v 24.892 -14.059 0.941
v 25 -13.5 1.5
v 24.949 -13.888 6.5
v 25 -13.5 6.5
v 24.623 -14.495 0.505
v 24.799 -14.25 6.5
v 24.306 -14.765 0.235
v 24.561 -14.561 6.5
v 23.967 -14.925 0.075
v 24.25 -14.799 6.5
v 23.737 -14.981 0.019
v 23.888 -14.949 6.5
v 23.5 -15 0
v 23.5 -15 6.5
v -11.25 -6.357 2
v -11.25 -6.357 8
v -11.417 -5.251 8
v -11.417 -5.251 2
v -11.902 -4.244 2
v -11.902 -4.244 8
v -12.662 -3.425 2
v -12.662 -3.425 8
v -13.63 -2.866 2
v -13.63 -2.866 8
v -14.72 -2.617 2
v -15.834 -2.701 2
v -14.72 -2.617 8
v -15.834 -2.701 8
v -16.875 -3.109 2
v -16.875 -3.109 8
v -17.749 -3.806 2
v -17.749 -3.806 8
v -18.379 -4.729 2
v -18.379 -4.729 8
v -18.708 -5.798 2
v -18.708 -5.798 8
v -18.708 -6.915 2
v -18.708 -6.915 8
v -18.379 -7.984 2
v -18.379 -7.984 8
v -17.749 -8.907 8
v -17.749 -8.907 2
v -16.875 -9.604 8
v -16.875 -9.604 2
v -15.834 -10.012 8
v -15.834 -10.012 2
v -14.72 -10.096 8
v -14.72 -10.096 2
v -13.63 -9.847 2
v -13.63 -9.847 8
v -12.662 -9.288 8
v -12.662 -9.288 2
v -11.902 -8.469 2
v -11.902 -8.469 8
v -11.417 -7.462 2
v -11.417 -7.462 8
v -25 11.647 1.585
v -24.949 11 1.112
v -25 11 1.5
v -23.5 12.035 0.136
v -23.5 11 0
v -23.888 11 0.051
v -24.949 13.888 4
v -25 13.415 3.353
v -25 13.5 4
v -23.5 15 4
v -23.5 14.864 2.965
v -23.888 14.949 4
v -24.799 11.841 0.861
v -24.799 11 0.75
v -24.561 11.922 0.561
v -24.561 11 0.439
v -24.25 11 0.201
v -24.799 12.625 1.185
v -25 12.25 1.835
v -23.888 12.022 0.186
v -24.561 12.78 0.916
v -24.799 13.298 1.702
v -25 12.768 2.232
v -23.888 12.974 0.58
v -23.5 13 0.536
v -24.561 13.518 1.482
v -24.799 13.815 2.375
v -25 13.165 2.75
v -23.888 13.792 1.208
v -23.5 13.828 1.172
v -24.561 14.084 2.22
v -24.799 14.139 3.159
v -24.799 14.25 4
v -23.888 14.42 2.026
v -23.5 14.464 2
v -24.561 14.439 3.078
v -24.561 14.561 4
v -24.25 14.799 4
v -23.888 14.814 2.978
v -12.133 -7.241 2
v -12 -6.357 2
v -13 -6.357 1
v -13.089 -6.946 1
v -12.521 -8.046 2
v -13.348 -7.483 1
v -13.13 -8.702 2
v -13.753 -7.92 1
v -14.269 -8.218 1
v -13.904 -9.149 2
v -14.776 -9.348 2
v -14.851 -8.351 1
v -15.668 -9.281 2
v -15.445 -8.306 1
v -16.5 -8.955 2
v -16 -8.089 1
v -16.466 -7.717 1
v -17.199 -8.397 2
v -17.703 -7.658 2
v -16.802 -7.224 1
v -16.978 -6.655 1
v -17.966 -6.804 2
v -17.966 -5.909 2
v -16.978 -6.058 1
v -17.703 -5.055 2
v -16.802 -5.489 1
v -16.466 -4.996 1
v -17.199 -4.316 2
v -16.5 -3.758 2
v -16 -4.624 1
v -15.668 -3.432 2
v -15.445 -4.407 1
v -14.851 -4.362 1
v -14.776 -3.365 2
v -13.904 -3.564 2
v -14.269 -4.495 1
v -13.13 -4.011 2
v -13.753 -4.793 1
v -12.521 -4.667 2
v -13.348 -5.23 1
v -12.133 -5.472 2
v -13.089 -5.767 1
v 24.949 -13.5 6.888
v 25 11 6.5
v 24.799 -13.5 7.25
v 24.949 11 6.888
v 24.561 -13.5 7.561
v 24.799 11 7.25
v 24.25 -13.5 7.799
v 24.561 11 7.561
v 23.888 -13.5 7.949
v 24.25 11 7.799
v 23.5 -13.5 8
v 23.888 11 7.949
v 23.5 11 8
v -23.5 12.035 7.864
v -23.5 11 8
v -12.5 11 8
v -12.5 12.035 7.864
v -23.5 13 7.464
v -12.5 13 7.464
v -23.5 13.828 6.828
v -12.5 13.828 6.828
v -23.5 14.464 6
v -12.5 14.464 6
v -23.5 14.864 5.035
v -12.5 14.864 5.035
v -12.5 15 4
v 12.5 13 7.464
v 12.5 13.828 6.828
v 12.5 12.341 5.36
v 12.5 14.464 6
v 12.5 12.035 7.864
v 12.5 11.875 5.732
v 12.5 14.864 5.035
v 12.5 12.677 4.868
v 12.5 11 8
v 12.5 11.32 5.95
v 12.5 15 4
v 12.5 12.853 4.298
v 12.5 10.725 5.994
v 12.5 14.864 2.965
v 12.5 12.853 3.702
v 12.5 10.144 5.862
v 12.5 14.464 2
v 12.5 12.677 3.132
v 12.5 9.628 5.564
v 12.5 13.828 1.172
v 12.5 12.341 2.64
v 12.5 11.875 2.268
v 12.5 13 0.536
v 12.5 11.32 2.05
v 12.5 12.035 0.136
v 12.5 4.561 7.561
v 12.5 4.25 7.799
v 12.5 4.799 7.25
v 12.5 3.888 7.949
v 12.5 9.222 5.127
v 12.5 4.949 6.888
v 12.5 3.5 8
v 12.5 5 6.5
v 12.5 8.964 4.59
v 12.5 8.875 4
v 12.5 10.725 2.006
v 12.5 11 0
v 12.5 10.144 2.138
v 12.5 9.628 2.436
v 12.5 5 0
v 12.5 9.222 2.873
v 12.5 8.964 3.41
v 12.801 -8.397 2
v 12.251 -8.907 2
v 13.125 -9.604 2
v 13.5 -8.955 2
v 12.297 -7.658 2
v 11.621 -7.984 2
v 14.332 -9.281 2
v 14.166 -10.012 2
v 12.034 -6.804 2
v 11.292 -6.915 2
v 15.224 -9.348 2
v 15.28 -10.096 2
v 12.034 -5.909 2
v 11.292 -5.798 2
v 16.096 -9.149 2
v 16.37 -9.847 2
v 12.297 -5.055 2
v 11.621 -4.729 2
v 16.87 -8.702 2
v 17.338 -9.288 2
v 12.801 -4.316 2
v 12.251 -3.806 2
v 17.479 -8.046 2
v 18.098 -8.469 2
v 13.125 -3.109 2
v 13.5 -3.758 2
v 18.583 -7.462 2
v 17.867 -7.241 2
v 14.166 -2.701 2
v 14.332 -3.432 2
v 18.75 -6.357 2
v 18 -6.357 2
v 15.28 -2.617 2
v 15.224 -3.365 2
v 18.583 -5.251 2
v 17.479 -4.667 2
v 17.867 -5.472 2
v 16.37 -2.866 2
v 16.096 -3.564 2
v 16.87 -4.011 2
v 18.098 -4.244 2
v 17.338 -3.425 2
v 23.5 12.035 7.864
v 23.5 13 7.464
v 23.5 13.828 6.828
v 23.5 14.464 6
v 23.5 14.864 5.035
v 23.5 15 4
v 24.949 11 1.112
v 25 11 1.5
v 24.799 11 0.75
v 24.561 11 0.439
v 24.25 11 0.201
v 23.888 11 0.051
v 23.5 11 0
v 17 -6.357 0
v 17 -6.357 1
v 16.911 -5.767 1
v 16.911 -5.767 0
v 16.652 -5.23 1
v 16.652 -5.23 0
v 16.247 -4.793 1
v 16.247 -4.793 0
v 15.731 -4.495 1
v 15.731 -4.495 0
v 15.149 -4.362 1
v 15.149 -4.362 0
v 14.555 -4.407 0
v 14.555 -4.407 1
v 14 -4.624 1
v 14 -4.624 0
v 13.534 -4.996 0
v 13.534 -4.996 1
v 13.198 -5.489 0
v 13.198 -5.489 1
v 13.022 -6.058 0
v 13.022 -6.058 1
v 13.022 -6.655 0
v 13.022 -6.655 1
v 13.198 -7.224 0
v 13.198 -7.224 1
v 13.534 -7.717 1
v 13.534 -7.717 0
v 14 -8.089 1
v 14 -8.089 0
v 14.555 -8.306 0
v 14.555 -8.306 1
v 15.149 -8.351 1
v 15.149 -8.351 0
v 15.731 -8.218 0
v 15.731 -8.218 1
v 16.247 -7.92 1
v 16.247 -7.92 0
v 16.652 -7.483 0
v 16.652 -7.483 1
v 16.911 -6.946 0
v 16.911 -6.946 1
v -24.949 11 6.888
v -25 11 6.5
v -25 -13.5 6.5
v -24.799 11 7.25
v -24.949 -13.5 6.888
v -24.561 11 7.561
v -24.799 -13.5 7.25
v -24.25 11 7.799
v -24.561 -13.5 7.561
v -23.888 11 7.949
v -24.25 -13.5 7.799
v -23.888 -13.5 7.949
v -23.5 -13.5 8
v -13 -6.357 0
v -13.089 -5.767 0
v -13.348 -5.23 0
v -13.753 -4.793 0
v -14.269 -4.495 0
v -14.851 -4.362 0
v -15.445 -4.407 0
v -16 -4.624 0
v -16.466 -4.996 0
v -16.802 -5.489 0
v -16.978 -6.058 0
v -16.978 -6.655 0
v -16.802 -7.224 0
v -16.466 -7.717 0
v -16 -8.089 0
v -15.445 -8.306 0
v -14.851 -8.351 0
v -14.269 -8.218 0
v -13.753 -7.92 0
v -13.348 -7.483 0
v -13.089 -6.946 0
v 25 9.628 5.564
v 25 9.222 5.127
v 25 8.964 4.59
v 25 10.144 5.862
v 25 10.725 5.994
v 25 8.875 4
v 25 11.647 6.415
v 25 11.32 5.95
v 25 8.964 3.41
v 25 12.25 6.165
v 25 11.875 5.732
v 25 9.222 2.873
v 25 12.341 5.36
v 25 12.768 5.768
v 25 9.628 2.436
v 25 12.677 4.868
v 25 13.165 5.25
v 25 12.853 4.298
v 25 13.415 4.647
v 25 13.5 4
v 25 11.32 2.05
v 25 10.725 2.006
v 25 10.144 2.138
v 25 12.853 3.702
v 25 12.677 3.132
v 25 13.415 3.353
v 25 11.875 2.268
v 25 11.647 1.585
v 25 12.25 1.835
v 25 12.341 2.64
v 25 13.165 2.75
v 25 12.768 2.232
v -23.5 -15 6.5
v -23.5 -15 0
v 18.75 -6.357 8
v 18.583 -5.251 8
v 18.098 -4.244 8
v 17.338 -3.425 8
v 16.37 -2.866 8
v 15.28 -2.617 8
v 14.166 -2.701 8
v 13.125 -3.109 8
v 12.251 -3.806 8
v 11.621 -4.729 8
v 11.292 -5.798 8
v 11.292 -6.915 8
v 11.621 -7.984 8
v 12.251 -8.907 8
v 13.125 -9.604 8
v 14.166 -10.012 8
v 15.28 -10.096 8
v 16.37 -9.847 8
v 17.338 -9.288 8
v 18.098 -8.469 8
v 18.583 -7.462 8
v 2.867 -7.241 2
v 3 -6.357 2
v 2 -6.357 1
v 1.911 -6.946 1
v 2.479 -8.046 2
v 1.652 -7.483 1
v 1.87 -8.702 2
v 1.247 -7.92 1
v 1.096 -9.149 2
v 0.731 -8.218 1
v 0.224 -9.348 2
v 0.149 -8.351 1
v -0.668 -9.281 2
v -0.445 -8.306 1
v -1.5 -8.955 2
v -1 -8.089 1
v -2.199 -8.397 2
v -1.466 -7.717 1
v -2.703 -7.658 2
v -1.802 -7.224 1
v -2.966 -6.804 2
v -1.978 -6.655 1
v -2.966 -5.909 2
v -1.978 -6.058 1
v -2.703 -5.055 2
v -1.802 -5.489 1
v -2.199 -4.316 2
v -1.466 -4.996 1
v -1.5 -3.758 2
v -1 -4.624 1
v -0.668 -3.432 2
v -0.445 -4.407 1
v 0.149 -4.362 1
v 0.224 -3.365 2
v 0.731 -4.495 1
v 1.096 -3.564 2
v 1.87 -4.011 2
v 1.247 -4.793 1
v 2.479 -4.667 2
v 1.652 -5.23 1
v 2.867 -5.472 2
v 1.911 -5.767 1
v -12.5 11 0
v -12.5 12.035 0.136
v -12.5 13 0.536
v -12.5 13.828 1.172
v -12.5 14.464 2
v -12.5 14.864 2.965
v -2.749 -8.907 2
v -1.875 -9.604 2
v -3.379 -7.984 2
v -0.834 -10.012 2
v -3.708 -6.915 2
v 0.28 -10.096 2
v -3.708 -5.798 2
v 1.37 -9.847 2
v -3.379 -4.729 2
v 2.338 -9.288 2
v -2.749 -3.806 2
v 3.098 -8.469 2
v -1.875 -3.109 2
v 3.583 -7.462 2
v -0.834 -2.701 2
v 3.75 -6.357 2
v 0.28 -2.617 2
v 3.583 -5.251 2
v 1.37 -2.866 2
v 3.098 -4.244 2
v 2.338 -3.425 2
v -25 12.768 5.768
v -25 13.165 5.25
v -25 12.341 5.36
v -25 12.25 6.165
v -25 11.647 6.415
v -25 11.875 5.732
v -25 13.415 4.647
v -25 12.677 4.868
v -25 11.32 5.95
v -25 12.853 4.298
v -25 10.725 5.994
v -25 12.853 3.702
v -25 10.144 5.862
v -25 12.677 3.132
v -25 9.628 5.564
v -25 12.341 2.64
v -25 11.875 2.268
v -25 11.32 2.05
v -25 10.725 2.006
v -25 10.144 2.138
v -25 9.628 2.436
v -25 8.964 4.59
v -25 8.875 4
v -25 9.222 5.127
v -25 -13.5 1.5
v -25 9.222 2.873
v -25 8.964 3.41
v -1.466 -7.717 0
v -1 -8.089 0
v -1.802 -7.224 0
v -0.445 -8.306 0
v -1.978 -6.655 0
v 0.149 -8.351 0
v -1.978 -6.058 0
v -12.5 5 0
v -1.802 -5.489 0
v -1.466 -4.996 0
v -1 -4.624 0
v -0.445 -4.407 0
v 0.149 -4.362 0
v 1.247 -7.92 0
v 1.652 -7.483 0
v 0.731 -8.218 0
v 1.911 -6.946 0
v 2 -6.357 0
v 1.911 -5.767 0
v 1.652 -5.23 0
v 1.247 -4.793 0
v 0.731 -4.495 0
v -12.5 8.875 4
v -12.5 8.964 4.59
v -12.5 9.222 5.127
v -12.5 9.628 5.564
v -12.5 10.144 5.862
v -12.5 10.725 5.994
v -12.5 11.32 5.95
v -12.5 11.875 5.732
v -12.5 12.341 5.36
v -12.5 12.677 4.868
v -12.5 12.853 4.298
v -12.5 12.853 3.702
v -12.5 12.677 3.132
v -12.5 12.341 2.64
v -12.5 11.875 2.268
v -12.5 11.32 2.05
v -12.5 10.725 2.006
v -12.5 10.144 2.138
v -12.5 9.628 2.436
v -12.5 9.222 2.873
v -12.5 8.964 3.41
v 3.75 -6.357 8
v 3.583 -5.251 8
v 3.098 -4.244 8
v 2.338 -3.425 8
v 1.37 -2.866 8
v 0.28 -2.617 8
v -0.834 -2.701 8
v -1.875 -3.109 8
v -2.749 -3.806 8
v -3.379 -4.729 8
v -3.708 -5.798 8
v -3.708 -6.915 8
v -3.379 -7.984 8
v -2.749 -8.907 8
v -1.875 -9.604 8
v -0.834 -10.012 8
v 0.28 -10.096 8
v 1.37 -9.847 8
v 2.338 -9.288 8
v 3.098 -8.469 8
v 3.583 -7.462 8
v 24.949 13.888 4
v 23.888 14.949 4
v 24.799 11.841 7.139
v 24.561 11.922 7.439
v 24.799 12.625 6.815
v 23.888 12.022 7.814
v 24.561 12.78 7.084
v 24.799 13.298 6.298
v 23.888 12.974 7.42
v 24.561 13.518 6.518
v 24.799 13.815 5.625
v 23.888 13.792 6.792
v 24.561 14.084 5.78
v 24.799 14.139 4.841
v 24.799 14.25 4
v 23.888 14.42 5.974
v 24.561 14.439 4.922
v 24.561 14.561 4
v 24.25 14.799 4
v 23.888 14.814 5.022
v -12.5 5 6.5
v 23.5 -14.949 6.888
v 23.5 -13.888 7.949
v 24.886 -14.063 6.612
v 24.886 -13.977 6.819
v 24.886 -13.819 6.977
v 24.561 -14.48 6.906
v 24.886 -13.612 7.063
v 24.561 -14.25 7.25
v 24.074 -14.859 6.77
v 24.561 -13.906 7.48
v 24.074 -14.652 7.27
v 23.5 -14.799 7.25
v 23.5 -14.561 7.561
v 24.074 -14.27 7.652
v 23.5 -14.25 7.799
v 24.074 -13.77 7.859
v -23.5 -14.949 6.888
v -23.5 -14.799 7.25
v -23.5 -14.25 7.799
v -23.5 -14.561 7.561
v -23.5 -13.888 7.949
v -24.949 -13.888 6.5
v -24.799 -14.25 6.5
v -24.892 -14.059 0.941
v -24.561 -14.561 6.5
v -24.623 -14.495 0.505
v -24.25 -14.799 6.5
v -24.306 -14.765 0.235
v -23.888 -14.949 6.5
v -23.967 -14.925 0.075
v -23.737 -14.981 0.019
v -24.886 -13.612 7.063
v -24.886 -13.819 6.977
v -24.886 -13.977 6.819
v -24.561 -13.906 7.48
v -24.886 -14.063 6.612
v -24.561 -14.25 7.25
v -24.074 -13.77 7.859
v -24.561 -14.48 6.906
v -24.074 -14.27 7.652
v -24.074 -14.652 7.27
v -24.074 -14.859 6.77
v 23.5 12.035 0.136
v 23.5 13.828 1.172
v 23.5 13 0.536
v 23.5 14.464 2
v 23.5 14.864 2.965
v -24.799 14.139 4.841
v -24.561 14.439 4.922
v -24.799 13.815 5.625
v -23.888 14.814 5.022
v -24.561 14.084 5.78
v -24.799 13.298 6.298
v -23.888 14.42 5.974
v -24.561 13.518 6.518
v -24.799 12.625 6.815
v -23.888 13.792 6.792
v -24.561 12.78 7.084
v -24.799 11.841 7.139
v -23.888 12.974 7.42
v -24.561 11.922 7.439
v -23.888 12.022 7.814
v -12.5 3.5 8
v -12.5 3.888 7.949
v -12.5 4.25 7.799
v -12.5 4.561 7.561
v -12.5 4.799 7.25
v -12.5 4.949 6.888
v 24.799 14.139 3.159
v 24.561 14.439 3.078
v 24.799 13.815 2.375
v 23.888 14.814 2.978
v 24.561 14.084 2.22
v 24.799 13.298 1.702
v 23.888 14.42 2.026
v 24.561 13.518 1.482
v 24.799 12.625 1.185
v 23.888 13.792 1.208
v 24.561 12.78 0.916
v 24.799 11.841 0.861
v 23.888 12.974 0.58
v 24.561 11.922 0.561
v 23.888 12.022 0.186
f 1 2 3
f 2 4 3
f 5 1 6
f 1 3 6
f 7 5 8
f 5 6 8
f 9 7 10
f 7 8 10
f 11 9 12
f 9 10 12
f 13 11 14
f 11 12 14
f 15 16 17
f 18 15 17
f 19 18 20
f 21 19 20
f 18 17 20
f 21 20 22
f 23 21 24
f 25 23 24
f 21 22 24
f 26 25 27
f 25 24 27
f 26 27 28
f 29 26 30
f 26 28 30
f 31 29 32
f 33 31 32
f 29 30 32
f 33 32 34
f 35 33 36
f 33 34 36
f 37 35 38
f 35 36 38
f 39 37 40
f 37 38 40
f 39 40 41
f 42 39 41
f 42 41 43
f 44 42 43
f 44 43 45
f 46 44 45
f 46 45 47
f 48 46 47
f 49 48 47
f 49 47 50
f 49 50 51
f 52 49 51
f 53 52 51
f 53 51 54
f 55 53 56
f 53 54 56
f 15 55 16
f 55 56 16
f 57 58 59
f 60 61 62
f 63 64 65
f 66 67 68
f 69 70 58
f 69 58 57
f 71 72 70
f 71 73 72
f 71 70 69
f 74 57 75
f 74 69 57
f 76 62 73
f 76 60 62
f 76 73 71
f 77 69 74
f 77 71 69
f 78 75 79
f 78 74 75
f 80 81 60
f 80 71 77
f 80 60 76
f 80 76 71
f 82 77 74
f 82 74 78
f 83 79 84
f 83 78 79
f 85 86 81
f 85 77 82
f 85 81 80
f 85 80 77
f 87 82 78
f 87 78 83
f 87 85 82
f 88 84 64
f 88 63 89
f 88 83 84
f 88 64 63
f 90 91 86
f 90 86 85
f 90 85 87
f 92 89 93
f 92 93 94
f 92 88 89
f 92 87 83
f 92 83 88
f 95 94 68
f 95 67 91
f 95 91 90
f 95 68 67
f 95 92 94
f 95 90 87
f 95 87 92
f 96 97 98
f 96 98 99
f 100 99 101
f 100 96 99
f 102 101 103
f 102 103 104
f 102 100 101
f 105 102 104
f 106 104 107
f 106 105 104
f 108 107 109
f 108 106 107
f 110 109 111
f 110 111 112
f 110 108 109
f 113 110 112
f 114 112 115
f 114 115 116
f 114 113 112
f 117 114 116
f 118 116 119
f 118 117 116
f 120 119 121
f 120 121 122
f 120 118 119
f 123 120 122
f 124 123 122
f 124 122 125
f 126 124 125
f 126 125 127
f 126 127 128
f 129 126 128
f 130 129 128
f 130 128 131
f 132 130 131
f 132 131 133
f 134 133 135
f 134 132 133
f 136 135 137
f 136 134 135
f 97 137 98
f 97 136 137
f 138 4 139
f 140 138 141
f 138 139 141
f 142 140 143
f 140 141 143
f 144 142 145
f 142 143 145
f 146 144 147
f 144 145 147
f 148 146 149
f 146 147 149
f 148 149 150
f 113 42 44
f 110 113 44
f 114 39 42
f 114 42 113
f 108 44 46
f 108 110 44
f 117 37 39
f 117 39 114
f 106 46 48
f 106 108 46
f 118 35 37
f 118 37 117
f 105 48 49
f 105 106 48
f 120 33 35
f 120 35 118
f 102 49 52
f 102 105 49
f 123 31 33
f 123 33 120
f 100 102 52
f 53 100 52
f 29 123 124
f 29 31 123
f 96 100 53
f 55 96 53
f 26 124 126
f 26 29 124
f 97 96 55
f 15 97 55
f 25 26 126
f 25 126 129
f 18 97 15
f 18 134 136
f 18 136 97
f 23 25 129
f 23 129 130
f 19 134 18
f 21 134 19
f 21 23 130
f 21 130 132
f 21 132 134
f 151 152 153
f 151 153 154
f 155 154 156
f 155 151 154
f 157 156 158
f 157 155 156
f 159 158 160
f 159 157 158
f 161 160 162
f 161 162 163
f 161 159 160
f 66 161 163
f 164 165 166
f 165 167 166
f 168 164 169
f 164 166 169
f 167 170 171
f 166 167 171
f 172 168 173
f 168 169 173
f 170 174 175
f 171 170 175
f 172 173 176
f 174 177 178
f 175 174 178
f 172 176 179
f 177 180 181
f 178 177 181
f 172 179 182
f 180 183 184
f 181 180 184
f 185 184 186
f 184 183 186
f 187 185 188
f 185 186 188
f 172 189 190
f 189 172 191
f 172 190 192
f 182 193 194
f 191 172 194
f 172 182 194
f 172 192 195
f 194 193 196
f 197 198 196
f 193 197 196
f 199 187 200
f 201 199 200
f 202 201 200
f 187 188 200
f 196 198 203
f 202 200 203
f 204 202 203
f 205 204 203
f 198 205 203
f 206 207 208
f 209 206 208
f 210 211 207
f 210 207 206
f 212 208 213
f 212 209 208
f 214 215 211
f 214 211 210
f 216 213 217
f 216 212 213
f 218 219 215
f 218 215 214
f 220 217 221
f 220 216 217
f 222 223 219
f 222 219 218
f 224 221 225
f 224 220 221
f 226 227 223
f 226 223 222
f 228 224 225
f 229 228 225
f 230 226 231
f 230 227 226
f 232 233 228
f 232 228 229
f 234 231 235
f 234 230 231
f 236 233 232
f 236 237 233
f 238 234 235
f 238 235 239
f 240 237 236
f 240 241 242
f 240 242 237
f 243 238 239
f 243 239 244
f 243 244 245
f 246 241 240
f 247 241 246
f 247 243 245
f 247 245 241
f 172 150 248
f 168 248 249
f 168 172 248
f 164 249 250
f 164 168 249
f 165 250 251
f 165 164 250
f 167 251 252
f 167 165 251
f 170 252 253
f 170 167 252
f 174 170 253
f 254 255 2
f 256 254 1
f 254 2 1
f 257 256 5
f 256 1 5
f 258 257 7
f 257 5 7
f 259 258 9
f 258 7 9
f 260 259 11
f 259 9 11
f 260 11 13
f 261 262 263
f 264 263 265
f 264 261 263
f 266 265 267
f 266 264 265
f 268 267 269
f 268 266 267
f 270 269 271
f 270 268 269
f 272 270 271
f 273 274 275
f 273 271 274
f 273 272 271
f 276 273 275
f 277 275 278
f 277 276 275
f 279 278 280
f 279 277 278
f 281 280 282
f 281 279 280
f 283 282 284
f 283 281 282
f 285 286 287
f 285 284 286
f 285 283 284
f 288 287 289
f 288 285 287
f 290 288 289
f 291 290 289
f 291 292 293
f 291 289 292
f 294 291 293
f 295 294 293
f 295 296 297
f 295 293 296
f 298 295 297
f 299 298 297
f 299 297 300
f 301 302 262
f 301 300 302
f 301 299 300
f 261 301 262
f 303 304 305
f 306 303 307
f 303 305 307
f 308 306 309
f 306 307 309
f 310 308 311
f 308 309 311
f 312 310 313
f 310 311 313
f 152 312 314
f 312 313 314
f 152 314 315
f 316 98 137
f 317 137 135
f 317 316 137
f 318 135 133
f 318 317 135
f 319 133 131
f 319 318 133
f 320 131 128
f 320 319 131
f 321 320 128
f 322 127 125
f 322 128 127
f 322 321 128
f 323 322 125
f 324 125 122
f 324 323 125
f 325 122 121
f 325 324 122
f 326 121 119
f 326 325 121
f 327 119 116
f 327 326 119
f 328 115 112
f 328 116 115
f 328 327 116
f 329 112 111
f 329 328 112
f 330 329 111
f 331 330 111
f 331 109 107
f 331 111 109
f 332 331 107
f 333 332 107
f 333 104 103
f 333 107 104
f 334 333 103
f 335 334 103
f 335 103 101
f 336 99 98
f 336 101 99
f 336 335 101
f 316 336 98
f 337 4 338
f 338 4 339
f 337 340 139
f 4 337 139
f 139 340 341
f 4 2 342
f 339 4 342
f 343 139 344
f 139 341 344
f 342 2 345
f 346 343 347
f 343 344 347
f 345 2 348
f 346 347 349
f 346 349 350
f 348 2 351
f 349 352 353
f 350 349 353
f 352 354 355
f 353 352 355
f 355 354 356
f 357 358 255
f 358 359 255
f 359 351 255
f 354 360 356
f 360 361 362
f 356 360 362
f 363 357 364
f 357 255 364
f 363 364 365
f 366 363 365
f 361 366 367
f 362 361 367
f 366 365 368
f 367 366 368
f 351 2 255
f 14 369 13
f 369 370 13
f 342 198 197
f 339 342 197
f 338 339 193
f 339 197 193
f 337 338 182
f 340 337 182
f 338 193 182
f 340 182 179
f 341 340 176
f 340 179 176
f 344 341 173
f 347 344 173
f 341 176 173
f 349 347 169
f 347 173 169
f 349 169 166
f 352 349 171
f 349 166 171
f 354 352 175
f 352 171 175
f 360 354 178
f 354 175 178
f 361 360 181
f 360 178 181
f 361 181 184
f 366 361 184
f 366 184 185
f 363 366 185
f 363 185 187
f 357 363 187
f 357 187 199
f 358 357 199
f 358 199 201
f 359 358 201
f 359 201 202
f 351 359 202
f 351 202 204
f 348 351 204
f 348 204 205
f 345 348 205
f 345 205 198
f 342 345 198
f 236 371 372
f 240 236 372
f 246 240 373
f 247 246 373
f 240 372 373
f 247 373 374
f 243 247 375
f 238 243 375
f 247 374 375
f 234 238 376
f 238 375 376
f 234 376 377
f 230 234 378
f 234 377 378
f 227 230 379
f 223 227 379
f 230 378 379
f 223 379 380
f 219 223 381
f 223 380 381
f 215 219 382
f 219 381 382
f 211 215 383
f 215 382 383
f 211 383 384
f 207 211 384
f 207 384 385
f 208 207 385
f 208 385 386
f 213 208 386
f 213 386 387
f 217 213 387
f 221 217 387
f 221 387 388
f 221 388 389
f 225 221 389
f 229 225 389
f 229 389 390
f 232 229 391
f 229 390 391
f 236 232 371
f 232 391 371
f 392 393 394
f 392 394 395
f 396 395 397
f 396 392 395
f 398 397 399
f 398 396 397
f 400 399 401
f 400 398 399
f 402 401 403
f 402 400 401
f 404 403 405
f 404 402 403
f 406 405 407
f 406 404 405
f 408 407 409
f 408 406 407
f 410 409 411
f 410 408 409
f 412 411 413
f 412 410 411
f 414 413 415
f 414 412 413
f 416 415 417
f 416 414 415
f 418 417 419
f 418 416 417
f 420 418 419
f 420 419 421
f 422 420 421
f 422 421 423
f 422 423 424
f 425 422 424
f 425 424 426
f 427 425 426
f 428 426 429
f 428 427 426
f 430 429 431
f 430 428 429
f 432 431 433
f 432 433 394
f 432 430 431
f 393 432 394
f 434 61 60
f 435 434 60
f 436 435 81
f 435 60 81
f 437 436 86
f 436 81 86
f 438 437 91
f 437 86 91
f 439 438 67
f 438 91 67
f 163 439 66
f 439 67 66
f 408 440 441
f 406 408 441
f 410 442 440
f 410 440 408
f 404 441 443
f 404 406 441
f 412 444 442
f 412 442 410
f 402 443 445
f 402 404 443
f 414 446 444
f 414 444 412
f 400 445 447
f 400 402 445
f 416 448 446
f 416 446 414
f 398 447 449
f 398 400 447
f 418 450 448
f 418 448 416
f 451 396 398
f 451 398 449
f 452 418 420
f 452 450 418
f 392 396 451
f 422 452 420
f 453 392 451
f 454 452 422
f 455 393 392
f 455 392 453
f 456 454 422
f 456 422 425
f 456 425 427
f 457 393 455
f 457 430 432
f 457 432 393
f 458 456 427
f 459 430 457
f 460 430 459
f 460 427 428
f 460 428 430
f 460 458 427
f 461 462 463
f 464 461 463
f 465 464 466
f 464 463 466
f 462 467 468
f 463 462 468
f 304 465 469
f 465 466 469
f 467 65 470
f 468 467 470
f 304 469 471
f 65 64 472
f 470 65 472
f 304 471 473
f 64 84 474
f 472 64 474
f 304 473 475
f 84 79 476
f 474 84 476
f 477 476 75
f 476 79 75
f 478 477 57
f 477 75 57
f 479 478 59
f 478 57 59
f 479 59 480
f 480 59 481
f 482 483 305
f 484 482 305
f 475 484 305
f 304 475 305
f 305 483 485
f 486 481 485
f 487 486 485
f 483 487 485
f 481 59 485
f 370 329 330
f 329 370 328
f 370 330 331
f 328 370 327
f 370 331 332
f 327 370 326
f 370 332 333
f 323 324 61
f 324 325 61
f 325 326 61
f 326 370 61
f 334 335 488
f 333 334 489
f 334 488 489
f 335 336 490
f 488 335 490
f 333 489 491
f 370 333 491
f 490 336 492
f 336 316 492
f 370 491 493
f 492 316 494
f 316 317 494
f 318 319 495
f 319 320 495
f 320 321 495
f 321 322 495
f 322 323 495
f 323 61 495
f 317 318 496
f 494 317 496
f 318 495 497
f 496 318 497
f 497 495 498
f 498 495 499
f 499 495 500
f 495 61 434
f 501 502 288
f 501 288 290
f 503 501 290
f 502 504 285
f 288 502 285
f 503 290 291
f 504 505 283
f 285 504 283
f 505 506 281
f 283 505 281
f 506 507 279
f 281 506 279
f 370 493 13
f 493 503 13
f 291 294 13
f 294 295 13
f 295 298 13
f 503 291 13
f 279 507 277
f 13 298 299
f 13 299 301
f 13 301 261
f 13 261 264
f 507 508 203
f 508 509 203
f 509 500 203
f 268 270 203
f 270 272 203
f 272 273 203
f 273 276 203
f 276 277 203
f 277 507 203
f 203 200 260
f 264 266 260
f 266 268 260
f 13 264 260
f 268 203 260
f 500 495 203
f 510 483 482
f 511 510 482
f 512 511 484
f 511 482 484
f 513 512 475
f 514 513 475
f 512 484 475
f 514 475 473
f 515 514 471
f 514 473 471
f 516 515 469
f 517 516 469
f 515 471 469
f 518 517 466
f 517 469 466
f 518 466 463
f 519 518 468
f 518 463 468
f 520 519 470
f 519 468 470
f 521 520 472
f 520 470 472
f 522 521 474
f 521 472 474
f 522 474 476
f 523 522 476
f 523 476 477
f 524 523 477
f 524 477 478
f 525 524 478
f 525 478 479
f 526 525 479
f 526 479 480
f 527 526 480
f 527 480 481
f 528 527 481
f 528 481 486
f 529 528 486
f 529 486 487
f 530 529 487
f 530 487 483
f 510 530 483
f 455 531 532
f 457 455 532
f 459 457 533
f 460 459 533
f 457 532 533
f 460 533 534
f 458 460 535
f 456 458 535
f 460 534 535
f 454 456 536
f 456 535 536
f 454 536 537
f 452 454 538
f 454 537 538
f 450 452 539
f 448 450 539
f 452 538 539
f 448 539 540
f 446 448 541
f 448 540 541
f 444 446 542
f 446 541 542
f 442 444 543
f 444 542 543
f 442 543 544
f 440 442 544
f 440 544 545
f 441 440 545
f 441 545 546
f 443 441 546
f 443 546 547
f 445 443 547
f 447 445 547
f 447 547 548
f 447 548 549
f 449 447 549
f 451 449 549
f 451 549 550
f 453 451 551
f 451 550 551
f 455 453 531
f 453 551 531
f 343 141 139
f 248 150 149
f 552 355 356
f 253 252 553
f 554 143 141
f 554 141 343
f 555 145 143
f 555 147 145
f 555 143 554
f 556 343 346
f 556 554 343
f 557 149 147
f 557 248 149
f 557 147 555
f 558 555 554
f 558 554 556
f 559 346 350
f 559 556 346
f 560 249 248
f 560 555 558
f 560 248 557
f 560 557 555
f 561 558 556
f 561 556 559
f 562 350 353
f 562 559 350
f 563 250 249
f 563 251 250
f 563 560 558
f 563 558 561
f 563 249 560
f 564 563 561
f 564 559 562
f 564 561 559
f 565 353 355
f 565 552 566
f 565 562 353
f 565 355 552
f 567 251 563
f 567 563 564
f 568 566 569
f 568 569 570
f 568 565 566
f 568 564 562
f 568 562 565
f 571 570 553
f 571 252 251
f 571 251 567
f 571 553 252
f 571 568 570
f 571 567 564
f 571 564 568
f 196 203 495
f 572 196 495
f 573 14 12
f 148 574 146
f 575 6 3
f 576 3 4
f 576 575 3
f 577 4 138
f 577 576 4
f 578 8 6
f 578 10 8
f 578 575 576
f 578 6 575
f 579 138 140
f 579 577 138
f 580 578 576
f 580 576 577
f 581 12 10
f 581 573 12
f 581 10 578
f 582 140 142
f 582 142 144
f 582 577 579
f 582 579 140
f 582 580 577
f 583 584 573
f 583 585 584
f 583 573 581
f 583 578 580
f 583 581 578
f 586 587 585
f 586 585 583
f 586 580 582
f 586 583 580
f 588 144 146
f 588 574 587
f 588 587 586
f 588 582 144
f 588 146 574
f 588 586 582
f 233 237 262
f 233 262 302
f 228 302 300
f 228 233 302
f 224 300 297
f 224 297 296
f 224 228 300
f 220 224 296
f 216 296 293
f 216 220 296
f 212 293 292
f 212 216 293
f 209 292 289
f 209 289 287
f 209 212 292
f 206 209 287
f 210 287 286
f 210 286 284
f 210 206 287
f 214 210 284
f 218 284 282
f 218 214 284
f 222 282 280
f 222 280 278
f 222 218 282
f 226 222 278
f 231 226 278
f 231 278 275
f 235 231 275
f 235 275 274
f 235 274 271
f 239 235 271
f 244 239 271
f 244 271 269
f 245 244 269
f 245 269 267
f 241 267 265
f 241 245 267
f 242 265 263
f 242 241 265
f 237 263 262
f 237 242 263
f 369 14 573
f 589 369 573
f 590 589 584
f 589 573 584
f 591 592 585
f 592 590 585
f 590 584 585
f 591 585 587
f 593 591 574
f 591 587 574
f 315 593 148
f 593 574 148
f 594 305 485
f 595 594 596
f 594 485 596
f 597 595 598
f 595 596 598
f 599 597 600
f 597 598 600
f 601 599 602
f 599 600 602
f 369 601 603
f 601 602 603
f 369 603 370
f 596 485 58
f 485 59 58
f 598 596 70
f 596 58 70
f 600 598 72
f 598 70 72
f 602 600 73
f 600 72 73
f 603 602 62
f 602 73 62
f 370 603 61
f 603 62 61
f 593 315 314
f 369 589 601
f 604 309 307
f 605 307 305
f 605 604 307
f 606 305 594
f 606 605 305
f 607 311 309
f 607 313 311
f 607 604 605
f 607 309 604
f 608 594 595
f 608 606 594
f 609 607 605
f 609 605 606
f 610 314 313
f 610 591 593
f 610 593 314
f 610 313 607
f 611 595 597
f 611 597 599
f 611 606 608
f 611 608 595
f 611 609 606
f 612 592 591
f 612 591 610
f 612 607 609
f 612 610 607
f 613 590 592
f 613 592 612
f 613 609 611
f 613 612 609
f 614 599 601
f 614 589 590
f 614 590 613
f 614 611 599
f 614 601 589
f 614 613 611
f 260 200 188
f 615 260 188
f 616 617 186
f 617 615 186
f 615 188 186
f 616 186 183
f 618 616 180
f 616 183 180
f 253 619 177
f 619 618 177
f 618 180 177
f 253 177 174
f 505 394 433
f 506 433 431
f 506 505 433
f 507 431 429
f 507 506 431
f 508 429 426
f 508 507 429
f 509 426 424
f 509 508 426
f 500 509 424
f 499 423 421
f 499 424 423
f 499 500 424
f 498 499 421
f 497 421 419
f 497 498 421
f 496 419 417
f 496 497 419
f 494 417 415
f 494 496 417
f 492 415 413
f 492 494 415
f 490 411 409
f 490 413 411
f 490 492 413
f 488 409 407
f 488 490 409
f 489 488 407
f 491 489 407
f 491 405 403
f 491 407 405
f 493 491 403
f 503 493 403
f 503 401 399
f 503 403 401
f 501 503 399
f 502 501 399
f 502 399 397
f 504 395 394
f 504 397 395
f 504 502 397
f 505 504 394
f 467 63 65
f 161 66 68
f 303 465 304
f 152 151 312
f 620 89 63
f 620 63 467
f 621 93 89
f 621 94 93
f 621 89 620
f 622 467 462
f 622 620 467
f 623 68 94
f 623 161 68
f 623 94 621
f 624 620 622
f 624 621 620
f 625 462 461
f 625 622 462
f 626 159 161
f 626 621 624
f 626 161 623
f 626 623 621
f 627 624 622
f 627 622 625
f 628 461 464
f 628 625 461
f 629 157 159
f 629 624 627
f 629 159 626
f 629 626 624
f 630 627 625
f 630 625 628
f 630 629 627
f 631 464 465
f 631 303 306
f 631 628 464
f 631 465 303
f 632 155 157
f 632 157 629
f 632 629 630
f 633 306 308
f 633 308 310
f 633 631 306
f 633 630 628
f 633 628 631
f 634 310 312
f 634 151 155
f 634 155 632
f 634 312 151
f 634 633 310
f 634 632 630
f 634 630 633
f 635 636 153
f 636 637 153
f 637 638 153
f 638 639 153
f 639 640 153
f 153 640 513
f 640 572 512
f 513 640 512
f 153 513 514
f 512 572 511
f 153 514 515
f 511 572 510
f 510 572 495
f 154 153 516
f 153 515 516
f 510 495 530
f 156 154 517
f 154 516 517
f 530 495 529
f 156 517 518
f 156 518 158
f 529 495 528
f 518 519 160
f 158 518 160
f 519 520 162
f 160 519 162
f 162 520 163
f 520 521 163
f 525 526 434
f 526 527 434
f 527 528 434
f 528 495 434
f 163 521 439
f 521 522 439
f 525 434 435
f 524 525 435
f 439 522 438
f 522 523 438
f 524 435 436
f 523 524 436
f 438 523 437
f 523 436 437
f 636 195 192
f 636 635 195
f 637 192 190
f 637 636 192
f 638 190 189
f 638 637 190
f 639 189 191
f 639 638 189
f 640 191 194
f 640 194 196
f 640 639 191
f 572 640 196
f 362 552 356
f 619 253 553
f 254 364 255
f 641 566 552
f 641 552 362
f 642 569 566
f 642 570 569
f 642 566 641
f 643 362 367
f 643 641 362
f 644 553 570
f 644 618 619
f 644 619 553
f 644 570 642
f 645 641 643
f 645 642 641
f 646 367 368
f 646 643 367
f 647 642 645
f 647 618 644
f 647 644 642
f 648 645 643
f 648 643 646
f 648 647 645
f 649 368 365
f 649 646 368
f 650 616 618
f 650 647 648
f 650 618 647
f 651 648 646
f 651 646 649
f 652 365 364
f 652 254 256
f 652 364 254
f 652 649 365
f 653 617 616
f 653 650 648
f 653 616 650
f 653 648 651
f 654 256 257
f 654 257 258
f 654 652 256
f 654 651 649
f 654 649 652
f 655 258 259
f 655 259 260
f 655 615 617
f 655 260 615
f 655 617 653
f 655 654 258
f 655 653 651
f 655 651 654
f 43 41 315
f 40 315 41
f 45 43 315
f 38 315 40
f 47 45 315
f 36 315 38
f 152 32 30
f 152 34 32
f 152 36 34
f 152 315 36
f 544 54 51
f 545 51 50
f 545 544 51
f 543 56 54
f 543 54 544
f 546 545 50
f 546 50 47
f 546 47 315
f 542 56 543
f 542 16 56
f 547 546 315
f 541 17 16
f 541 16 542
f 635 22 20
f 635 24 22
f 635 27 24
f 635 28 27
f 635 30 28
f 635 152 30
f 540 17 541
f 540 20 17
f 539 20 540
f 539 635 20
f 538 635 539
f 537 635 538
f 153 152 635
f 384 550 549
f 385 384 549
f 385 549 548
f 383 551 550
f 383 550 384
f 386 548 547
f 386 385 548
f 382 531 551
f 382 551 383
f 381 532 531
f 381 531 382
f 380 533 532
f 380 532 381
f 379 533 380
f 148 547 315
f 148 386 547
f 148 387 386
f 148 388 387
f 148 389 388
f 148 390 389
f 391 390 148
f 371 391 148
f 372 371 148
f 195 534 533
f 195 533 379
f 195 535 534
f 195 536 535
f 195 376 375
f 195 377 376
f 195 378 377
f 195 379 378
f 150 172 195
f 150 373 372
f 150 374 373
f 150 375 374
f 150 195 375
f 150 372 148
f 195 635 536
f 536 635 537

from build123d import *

# Parameters (mm, degrees)
F0_R     = 2
F1_DEPTH = 8
F2_R     = 2
F3_DEPTH = 60
F4_R     = 3.99999
F5_R     = 1.5
F6_R     = 3.75
F7_DEPTH = 6
F8_SIZE  = 1
F9_R     = 1.5


# Not quite as in the source:
# - a fillet or chamfer is up to 0.001 mm smaller than in the source, because OpenCascade refuses the exact size


with BuildPart() as f1:
    # F0 (on Top) → F1 (new body)
    with BuildSketch(Plane.XY):
        Polygon((25, -15), (25, 15), (12.5, 15), (12.5, 5), (-12.5, 5), (-12.5, 15), (-25, 15), (-25, -15), align=None)
        with Locations((-15, -6.3565024175)):
            Circle(F0_R, mode=Mode.SUBTRACT)
        with Locations((0, -6.3565024175)):
            Circle(F0_R, mode=Mode.SUBTRACT)
        with Locations((15, -6.3565024175)):
            Circle(F0_R, mode=Mode.SUBTRACT)
    extrude(amount=F1_DEPTH)

    # F2 (on face) → F3 (cut)
    with BuildSketch(Plane(origin=(-25, 0, 0), x_dir=(0, -1, 0), z_dir=(-1, 0, 0))):
        with Locations((-10.8748758212, 4)):
            Circle(F2_R)
    extrude(amount=-F3_DEPTH, mode=Mode.SUBTRACT)

    # F4 (radius 4 in the source; OpenCascade refuses exactly that, so slightly less here)
    f4_edges = [f1.edges().sort_by_distance(p)[0] for p in [
        (-18.75, 15, 8),
        (18.75, 15, 8),
        (-18.75, 15, 0),
        (18.75, 15, 0),
    ]]
    fillet(f4_edges, radius=F4_R)

    # F5
    f5_edges = [f1.edges().sort_by_distance(p)[0] for p in [
        (0, 5, 8),
        (0, -15, 8),
    ]]
    fillet(f5_edges, radius=F5_R)

    # F6 (on face) → F7 (cut)
    with BuildSketch(Plane.XY.offset(8)):
        with Locations((-15, -6.3565024175)):
            Circle(F6_R)
        with Locations((0, -6.3565024175)):
            Circle(F6_R)
        with Locations((15, -6.3565024175)):
            Circle(F6_R)
    extrude(amount=-F7_DEPTH, mode=Mode.SUBTRACT)

    # F8
    f8_edges = [f1.edges().sort_by_distance(p)[0] for p in [
        (-17, -6.356502, 2),
        (-2, -6.356502, 2),
        (13, -6.356502, 2),
    ]]
    chamfer(f8_edges, length=F8_SIZE)

    # F9
    f9_edges = [f1.edges().sort_by_distance(p)[0] for p in [
        (25, -1.249995, 8),
        (-25, -1.249995, 8),
    ]]
    fillet(f9_edges, radius=F9_R)


solid = f1.part
